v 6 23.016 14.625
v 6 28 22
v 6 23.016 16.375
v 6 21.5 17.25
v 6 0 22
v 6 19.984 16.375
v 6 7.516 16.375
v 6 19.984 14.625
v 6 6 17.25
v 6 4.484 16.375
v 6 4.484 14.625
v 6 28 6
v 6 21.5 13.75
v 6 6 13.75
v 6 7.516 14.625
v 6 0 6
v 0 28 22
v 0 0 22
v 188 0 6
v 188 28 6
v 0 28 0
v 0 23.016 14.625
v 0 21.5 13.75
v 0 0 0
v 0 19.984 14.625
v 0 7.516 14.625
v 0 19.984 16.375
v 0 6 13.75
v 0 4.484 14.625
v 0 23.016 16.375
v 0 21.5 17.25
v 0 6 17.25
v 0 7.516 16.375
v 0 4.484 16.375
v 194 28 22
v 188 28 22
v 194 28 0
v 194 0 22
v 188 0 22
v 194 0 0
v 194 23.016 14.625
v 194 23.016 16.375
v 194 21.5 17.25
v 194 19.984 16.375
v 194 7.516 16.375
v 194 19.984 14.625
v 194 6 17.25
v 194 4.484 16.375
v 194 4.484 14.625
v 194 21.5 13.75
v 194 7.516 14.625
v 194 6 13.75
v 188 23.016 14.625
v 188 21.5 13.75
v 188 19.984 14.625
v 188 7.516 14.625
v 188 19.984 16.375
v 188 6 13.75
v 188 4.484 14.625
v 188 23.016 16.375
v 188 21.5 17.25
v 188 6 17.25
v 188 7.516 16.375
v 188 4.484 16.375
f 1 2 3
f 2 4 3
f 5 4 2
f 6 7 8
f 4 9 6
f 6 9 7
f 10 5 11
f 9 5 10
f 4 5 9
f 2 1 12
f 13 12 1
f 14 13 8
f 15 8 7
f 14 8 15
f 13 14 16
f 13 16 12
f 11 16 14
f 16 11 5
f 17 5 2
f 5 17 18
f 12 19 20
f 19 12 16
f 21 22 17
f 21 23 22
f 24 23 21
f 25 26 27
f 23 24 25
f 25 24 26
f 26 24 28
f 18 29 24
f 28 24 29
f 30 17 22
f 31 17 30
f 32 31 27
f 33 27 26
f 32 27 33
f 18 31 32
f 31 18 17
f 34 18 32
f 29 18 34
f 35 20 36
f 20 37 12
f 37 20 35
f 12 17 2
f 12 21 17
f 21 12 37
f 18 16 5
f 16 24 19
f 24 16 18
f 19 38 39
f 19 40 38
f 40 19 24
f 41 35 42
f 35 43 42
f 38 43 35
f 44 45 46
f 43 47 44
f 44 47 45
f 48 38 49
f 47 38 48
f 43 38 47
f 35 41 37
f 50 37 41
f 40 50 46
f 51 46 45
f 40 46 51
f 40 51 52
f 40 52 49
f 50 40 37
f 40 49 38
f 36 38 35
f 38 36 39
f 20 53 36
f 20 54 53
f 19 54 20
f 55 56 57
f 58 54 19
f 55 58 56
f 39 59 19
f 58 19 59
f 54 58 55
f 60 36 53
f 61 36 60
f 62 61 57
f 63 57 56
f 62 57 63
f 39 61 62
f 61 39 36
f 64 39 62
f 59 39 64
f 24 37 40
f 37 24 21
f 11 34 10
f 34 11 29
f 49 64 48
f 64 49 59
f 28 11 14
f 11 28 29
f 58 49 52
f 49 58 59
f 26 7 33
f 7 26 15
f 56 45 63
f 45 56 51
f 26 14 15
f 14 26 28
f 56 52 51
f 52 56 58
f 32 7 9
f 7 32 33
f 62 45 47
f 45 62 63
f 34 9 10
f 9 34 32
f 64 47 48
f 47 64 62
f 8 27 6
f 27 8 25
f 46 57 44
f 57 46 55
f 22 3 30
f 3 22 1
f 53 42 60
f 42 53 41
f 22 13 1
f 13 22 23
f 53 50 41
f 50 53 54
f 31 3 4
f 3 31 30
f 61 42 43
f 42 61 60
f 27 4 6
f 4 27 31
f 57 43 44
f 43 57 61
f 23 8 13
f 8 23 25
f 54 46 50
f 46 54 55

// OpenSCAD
length = 194;
height = 22;
width = 28;
thickness = 6;
hole_radius = 1.75;

bracket();

module bracket(){
	color("White")
	difference() {
		// bracket
		union(){
			cube([length, width, thickness]);
			translate([0,0,thickness]){
				coords = [thickness, width, height - thickness];
				cube(coords);
				translate([length - thickness,0,0]){
					cube(coords);
				}
			}
		}

		// screw holes
		translate([-5, width / 2 - 8, 15.5]){
			rotate([0,90,0]){
				cylinder(r=hole_radius, h=length + 10);
				translate([0,15.5,0]){
					cylinder(r=hole_radius, h=length + 10);
				}
			}
		}
	}
}
